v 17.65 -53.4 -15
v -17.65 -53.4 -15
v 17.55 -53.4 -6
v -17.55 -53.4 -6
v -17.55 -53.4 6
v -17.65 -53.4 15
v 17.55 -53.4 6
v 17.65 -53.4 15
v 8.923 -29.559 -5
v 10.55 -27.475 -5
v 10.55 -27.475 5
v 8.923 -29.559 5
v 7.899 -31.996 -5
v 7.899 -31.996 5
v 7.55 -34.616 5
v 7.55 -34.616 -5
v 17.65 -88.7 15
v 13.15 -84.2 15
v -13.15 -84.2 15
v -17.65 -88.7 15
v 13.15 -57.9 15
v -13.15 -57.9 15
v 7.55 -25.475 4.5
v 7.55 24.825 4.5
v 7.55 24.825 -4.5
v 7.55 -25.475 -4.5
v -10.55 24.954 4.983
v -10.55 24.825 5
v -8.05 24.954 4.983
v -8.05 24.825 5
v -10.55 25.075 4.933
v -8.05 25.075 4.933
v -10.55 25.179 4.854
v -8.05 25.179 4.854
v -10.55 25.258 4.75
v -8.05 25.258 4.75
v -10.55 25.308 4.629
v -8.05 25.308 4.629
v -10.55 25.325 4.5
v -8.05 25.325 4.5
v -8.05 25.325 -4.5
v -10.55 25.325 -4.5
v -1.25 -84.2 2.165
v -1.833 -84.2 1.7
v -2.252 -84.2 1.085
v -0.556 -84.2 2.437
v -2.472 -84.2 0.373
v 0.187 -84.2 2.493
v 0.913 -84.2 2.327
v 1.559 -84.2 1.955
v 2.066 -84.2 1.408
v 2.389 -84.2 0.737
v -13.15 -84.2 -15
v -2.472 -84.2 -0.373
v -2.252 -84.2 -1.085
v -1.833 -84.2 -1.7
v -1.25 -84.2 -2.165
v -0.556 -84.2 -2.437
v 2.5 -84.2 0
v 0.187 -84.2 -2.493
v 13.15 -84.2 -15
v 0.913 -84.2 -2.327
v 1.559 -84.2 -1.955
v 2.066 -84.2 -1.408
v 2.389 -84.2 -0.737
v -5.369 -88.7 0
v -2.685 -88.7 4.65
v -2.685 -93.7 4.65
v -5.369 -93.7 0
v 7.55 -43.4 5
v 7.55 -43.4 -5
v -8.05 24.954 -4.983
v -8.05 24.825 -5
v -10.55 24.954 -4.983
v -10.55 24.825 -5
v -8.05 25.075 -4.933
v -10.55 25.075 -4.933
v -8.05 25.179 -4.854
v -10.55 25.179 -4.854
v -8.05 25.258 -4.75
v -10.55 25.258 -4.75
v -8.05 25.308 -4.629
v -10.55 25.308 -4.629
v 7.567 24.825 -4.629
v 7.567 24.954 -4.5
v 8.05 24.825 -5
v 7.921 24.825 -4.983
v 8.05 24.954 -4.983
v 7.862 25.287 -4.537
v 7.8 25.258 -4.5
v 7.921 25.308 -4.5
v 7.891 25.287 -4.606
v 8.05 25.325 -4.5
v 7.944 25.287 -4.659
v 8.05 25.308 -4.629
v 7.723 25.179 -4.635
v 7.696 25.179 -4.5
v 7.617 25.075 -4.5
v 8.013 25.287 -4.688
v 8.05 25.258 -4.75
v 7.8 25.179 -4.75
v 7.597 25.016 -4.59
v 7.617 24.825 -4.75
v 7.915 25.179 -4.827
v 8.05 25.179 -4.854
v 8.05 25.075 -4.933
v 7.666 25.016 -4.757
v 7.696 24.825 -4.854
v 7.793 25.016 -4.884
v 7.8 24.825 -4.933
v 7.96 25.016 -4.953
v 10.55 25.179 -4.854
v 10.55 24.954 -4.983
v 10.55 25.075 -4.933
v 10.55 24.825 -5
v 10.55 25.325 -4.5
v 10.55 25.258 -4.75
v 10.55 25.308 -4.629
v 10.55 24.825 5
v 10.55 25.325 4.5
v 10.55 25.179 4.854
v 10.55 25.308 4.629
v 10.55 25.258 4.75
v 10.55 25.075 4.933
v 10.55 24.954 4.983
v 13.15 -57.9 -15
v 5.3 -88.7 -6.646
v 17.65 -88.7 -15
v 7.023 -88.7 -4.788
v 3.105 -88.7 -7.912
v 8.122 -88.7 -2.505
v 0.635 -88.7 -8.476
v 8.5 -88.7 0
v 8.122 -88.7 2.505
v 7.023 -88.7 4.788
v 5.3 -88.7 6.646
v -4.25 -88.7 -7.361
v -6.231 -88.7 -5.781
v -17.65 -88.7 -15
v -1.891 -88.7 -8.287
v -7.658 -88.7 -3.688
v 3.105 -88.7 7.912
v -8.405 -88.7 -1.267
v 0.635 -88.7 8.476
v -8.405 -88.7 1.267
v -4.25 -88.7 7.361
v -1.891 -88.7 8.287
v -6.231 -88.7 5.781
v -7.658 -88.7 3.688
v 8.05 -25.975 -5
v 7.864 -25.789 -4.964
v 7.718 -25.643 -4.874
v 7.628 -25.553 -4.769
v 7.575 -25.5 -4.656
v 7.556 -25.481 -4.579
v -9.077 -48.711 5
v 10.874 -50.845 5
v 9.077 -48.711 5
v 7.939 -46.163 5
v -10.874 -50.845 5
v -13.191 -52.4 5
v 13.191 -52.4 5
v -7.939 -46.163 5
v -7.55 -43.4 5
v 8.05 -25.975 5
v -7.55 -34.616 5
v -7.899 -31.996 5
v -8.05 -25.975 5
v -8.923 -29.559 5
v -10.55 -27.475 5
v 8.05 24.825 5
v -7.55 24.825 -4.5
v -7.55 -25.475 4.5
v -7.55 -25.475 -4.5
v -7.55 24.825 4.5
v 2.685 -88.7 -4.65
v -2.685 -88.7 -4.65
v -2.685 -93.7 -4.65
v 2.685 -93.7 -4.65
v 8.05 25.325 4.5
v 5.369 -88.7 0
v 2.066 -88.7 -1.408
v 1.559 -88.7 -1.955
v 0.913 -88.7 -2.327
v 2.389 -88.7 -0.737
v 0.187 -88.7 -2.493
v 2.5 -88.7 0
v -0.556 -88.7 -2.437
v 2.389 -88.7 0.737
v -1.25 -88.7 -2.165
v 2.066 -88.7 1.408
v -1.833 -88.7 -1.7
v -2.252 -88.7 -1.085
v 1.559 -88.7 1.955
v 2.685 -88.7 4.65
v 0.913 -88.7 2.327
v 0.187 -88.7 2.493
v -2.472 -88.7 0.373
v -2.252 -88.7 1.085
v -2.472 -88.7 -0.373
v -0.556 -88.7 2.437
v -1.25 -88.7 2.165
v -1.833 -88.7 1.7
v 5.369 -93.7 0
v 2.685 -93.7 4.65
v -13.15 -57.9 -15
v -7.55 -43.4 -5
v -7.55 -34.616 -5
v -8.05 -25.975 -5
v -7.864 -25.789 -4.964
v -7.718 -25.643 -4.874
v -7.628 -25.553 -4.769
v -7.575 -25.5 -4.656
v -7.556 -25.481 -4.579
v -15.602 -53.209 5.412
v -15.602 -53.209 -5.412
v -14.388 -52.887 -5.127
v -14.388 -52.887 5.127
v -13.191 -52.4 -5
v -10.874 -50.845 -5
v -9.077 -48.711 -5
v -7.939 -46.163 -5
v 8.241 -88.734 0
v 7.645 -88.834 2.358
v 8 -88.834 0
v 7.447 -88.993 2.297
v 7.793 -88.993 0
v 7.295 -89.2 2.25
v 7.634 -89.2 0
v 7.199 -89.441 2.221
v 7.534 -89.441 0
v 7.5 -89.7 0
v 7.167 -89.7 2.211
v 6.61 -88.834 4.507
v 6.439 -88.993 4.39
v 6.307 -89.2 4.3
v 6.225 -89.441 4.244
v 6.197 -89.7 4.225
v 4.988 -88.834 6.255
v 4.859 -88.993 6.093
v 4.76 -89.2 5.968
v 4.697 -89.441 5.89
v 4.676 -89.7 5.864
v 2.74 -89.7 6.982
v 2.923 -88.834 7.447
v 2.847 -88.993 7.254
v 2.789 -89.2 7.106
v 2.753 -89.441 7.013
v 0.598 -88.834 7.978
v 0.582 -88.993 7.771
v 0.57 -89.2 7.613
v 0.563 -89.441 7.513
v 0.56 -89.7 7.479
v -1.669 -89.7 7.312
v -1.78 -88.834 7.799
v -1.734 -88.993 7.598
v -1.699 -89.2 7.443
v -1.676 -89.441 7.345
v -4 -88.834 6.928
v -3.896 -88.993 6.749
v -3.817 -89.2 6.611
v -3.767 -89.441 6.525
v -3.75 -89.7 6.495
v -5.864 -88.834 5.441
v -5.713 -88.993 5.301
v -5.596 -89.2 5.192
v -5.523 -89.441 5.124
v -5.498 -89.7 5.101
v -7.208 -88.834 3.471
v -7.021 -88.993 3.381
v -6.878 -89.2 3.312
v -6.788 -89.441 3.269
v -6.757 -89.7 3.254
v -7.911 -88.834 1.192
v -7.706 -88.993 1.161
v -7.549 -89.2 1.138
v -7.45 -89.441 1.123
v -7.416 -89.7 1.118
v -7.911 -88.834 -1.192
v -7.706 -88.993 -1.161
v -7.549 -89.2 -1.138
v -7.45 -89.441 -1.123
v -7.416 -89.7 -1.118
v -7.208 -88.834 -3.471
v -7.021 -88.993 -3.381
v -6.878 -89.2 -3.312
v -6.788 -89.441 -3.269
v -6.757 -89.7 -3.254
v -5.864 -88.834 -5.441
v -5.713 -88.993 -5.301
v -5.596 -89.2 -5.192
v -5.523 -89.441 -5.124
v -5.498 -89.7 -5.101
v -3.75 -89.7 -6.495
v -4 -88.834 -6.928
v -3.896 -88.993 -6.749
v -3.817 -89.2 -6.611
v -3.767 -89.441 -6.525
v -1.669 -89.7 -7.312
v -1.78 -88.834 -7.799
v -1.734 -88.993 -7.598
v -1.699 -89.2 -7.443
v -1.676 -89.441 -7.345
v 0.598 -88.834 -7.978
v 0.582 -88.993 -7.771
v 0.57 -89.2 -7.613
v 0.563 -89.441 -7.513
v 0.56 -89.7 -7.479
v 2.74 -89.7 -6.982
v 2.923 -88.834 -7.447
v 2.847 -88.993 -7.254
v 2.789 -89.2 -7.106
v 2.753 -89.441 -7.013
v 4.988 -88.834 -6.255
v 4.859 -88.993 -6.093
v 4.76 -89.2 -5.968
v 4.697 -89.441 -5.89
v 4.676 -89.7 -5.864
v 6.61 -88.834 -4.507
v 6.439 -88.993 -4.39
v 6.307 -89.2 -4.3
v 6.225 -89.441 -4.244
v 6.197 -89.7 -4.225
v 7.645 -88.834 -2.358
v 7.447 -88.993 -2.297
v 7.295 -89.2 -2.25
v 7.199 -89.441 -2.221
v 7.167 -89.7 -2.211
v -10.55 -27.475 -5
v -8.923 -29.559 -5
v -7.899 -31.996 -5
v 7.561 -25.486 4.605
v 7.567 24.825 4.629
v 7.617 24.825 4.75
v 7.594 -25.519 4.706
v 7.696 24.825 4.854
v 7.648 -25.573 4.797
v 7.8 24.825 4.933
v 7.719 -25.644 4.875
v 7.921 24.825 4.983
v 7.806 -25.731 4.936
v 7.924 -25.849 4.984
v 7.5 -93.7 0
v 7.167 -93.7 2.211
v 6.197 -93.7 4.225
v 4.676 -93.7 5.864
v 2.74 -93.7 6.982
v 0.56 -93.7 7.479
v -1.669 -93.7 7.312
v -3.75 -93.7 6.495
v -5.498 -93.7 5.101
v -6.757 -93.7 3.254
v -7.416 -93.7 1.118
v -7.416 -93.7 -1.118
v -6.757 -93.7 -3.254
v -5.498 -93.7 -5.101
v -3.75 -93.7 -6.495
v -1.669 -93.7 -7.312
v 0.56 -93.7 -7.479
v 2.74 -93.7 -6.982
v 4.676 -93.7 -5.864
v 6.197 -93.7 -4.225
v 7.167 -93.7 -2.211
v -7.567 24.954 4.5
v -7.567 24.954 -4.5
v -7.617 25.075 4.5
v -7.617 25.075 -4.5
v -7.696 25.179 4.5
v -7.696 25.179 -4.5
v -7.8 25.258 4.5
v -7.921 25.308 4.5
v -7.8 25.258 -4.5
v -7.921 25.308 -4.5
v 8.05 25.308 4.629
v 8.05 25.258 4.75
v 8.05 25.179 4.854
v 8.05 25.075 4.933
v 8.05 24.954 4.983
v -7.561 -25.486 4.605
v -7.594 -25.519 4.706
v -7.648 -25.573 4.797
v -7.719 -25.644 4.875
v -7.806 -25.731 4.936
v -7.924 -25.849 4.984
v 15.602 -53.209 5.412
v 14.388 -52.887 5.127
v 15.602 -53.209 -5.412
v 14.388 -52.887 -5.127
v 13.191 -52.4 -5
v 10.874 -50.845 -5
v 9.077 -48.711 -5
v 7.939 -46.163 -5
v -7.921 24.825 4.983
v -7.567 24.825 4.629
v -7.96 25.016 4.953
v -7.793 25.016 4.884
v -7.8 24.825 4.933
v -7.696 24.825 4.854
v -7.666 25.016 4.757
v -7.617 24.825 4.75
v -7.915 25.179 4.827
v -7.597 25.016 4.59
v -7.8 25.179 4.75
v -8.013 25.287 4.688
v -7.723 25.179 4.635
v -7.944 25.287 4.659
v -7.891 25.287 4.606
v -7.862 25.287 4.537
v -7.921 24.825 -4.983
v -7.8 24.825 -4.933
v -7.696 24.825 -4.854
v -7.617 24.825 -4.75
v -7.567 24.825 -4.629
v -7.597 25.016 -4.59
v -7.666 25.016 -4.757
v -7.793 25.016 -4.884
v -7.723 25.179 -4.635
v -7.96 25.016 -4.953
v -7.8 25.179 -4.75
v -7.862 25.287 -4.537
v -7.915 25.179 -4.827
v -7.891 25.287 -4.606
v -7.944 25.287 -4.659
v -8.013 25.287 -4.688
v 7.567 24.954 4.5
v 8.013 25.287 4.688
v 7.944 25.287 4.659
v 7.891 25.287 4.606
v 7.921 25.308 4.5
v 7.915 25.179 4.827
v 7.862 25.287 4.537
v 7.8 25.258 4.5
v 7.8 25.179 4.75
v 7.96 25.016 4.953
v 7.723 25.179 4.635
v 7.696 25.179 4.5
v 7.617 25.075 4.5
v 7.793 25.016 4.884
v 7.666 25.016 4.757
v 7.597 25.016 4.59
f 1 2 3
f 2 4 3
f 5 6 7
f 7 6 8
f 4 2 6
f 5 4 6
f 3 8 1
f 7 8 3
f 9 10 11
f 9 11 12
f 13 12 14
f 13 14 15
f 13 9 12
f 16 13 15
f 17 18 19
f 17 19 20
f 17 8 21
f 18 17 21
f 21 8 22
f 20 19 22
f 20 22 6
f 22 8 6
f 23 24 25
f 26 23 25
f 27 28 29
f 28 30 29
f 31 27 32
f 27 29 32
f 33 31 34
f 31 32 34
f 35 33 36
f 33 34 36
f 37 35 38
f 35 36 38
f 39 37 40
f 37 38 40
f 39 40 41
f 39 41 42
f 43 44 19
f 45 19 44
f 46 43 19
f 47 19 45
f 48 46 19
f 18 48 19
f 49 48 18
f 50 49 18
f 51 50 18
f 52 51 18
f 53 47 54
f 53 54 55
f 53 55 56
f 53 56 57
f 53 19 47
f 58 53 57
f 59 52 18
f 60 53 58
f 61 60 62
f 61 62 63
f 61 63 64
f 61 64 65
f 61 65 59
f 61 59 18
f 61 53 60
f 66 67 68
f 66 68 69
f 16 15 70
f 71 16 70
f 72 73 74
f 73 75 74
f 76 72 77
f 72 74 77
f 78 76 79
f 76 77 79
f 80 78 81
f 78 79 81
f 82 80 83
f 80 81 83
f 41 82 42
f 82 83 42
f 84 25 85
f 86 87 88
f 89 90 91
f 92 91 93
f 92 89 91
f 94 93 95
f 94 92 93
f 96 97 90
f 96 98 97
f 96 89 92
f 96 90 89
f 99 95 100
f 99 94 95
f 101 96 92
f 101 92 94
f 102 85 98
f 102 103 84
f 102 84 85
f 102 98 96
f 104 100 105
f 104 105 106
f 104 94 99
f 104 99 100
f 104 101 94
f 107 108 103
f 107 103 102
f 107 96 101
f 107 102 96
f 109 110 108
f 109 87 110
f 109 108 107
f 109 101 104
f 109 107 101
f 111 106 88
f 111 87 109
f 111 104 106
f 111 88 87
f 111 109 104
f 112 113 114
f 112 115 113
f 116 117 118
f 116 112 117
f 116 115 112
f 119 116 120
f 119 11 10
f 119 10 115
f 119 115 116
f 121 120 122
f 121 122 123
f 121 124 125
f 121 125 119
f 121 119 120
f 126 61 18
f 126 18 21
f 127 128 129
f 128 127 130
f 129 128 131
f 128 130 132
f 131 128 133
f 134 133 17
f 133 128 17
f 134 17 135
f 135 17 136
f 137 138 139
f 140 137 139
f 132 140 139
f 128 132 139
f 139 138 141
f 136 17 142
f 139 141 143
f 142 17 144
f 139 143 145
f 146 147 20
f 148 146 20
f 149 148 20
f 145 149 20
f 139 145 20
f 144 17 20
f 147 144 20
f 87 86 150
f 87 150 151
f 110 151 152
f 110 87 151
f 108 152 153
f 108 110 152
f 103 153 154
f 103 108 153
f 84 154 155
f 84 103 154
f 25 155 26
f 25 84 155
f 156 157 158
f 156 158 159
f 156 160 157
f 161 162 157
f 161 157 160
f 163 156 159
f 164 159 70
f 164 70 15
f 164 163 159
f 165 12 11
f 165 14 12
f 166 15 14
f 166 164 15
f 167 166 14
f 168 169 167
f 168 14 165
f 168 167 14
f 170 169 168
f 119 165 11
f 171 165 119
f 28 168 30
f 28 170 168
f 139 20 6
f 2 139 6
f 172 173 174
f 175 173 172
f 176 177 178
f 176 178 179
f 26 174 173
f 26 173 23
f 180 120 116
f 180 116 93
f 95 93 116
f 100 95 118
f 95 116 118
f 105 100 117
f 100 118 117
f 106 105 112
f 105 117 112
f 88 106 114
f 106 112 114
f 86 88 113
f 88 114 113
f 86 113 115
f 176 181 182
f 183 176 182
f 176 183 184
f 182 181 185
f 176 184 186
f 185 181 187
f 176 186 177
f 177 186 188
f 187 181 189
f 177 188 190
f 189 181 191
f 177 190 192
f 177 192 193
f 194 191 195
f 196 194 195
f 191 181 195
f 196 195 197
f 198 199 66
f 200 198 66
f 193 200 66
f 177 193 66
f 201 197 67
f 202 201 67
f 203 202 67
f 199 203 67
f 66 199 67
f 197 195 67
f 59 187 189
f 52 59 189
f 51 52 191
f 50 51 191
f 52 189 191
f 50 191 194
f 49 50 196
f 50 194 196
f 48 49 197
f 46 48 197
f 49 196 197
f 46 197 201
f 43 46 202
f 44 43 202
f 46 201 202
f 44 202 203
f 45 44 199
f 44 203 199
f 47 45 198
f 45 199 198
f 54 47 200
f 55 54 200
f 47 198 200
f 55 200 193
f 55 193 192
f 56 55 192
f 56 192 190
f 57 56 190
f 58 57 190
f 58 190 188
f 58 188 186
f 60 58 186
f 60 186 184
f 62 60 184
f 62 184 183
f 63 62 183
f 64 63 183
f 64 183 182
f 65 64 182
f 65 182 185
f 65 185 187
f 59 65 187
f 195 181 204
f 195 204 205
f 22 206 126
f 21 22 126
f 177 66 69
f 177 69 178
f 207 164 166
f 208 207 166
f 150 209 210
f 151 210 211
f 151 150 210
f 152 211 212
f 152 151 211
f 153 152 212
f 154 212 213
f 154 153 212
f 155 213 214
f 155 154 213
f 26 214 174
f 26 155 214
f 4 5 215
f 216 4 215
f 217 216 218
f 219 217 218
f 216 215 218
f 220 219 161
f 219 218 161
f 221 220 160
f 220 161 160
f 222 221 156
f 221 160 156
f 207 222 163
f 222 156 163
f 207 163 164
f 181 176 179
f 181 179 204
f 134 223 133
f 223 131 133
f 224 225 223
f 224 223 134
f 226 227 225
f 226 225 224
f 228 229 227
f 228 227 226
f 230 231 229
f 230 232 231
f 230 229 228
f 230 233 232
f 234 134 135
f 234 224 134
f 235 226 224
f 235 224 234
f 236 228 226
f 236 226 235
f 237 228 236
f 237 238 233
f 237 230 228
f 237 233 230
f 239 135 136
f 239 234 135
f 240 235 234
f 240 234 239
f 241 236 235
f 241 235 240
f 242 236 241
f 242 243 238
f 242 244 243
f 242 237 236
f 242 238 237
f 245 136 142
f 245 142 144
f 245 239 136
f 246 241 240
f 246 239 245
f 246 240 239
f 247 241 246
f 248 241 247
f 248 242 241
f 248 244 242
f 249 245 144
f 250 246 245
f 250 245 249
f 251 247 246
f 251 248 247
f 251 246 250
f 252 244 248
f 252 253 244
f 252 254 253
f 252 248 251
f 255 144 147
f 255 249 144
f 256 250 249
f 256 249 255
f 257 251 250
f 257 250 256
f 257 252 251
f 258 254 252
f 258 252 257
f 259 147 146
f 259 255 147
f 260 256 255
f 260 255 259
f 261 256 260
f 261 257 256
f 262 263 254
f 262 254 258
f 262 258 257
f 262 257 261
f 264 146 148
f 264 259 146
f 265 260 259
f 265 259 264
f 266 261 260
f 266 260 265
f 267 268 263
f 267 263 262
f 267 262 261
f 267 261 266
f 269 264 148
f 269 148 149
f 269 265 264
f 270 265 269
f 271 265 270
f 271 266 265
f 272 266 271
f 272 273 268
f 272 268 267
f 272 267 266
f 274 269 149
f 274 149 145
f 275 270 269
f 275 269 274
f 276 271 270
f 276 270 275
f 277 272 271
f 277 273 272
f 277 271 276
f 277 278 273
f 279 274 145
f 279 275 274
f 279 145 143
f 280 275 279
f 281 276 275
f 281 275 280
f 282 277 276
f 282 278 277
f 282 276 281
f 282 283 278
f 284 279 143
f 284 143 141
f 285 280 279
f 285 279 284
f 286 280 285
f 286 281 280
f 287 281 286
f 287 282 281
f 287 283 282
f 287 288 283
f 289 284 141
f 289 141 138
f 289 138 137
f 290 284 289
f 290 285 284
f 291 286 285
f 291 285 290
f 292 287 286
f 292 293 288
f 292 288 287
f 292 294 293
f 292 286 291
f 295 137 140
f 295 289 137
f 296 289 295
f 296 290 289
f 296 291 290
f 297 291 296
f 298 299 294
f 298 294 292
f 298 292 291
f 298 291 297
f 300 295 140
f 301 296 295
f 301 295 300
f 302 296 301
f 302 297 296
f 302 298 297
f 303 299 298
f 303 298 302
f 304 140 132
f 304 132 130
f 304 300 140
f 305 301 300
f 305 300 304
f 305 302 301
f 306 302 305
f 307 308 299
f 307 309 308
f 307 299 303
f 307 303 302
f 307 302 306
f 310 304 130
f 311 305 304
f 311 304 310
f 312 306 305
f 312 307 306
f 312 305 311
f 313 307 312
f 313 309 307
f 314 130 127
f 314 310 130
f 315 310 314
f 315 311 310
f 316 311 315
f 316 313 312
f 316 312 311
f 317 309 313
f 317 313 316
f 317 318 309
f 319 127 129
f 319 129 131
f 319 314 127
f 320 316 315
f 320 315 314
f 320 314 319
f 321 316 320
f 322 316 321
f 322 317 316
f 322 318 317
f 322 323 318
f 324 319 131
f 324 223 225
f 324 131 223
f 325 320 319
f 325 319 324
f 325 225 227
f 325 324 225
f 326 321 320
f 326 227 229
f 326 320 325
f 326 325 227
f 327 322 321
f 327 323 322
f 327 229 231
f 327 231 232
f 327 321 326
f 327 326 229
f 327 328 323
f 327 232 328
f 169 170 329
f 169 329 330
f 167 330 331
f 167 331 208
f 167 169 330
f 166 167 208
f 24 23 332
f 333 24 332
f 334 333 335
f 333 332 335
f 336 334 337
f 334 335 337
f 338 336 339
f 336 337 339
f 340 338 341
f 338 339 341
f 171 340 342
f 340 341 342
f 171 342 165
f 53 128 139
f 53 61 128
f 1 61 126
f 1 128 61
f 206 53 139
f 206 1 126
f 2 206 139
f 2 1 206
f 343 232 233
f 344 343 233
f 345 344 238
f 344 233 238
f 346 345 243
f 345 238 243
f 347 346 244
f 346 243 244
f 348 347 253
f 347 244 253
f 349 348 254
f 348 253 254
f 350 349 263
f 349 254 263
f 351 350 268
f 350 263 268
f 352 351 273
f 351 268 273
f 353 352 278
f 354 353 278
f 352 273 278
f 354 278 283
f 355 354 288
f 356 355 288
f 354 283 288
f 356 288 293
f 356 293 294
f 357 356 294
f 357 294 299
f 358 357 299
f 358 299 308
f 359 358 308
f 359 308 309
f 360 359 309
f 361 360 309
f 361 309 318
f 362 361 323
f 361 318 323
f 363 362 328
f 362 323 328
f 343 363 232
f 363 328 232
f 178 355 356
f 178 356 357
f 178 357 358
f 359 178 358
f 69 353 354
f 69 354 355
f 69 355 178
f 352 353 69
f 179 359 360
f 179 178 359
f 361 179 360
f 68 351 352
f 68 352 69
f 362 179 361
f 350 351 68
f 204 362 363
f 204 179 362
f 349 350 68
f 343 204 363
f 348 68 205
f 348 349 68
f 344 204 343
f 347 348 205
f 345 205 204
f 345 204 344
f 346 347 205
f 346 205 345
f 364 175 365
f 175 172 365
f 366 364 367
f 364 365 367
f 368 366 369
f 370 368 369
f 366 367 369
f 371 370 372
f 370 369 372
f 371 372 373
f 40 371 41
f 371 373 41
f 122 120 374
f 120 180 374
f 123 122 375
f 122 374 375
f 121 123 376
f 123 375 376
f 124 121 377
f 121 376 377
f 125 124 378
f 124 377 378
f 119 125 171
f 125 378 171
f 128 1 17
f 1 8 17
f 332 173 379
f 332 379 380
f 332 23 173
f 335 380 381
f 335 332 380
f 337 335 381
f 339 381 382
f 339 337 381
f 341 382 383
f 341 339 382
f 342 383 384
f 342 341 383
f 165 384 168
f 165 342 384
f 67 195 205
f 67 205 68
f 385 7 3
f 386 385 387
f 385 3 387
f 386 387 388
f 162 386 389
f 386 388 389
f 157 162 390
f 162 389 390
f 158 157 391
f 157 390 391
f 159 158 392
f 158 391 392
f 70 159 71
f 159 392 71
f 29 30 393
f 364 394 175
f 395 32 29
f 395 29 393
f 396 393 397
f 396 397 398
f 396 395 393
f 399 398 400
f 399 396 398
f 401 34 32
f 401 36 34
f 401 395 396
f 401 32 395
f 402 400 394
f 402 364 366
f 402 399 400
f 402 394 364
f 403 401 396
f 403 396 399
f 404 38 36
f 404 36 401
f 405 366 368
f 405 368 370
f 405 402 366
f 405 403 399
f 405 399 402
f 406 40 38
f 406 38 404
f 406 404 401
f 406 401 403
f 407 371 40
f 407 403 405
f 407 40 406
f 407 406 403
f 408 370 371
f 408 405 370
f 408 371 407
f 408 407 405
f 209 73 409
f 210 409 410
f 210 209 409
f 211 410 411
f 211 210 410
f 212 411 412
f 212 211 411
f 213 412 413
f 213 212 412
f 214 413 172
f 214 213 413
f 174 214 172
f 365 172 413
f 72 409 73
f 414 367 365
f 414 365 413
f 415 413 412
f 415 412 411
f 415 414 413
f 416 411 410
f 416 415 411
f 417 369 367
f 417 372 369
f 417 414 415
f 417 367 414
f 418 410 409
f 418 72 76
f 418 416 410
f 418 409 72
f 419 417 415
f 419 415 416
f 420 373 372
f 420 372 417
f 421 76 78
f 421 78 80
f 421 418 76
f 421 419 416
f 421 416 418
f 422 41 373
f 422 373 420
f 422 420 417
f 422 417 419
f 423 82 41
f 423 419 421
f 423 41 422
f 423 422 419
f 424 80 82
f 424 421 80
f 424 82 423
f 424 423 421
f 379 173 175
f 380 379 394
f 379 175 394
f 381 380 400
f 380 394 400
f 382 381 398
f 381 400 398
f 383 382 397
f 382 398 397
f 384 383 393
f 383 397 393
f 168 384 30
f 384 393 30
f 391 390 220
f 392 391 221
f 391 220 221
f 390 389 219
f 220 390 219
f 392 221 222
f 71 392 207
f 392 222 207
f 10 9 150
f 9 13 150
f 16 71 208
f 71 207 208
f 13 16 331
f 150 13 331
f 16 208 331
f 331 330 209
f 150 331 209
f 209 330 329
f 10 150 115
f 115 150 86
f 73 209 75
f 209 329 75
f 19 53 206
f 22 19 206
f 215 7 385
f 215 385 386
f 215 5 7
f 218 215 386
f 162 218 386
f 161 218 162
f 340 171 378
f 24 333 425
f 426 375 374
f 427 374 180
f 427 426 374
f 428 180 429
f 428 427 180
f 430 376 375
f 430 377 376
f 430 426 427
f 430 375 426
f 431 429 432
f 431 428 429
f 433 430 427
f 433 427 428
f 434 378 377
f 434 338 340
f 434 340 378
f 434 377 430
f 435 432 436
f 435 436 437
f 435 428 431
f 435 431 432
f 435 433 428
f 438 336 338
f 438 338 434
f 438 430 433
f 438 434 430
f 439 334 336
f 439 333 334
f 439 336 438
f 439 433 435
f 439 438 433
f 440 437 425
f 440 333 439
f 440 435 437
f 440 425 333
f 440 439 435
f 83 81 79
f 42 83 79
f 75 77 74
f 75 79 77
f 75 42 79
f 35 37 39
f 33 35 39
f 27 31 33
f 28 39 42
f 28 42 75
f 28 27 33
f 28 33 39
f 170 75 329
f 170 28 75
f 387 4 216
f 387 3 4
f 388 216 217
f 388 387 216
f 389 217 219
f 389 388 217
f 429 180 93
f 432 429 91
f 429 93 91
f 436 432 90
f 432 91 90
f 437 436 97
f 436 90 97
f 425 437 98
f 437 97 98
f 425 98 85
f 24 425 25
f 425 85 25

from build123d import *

# Parameters (mm, degrees)
SKETCH2_W               = 25.3
SKETCH2_H               = 25.3
BOSS_EXTRUDE1_DEPTH     = 15
CUT_EXTRUDE1_DEPTH      = 94.422320673
CUT_EXTRUDE1_DEPTH_BACK = 94.422320673
SKETCH3_W               = 10
SKETCH3_H               = 61.95
FILLET1_R               = 10
FILLET2_R               = 1
SKETCH4_R               = 7.5
BOSS_EXTRUDE2_DEPTH     = 5
FILLET3_R               = 1
CUT_EXTRUDE2_REACH      = 101.97
SKETCH5_R               = 2.5
BOSS_EXTRUDE3_DEPTH     = 10
FILLET4_R               = 10
SKETCH11_W              = 15.1
SKETCH11_H              = 10
CUT_EXTRUDE4_DEPTH      = 34.025
FILLET5_R               = 0.5
FILLET6_R               = 0.5
CUT_EXTRUDE5_DEPTH      = 100.956052843
CUT_EXTRUDE5_DEPTH_BACK = 100.956052843
SKETCH12_W              = 26.3
SKETCH12_H              = 26.3


with BuildPart() as part:
    # Sketch2 → Boss-Extrude1 (new, symmetric)
    with BuildSketch(Plane.XY):
        Polygon((-7.55, -53.4), (-7.55, 8.55), (7.55, 8.55), (7.55, -53.4), (17.65, -53.4), (17.65, -88.7), (-17.65, -88.7), (-17.65, -53.4), align=None)
        with Locations((0, -71.05)):
            Rectangle(SKETCH2_W, SKETCH2_H, mode=Mode.SUBTRACT)
    extrude(amount=BOSS_EXTRUDE1_DEPTH, both=True)

    # Sketch3 → Cut-Extrude1 (cut, two sides: drawn at the far end of the back side and taken through both)
    with BuildSketch(Plane(origin=(7.55, 0, 0), x_dir=(0, 0, -1), z_dir=(1, 0, 0)).offset(-CUT_EXTRUDE1_DEPTH_BACK)):
        with Locations((-10, -22.425)):
            Rectangle(SKETCH3_W, SKETCH3_H)
        with Locations((10, -22.425)):
            Rectangle(SKETCH3_W, SKETCH3_H)
    extrude(amount=CUT_EXTRUDE1_DEPTH + CUT_EXTRUDE1_DEPTH_BACK, mode=Mode.SUBTRACT)

    # Fillet1
    fillet1_edges = [part.edges().sort_by_distance(p)[0] for p in [
        (-7.55, -53.4, 0),
        (7.55, -53.4, 0),
    ]]
    fillet(fillet1_edges, radius=FILLET1_R)

    # Fillet2
    fillet2_edges = [part.edges().sort_by_distance(p)[0] for p in [
        (0, -53.4, 5),
        (0, -53.4, -5),
    ]]
    fillet(fillet2_edges, radius=FILLET2_R)

    # Sketch4 → Boss-Extrude2 (add)
    with BuildSketch(Plane.XZ.offset(88.7)):
        Circle(SKETCH4_R)
        Polygon((5.369357503, 0), (2.684678752, 4.65), (-2.684678752, 4.65), (-5.369357503, 0), (-2.684678752, -4.65), (2.684678752, -4.65), align=None, mode=Mode.SUBTRACT)
    extrude(amount=BOSS_EXTRUDE2_DEPTH)

    # Fillet3
    fillet3_edges = [part.edges().sort_by_distance(p)[0] for p in [
        (-7.5, -88.7, 0),
    ]]
    fillet(fillet3_edges, radius=FILLET3_R)

    # Sketch5 → Cut-Extrude2 (cut, up to next)
    with BuildSketch(Plane.XZ.offset(88.7), mode=Mode.PRIVATE) as cut_extrude2_sk1:
        Circle(SKETCH5_R)
    cut_extrude2_tool1 = extrude(cut_extrude2_sk1.sketch, amount=-CUT_EXTRUDE2_REACH, mode=Mode.PRIVATE) & part.part
    add(cut_extrude2_tool1.solids().sort_by_distance((0, -88.7, 0))[0], mode=Mode.SUBTRACT)

    # Sketch9 → Boss-Extrude3 (add)
    with BuildSketch(Plane.XY.offset(5)):
        Polygon((-10.55, -27.475), (-7.55, -27.475), (-7.55, -25.475), (-7.55, 8.55), (-7.55, 25.325), (-10.55, 25.325), (-10.55, -25.325), align=None)
        Polygon((10.55, 25.325), (7.55, 25.325), (7.55, 8.55), (7.55, -25.475), (7.55, -27.475), (10.55, -27.475), (10.55, -25.325), align=None)
        Polygon((7.55, -27.475), (7.55, -25.475), (7.4, -25.475), (-7.4, -25.475), (-7.55, -25.475), (-7.55, -27.475), align=None)
    extrude(amount=-BOSS_EXTRUDE3_DEPTH)

    # Fillet4
    # the kernel refuses this fillet: 10 mm, written as the material it adds along each edge
    with BuildSketch(Plane(origin=(-7.55, -27.475, 5), x_dir=(0, -1, 0), z_dir=(0, 0, -1)), Plane(origin=(7.55, -27.475, -5), x_dir=(0, -1, 0), z_dir=(0, 0, 1))) as fillet4_piece_1:
        with BuildLine():
            CenterArc((7.141428429, 10), FILLET4_R, 224.427004001, 45.572995999)
            Line((0, 3), (-0.142828569, 2.86))
            ThreePointArc((-0.142828569, 2.86), (-0.2, 1.5), (-0.2, 0))
            Line((-0.2, 0), (0, -0.2))
            Line((0, -0.2), (7.141428429, -0.2))
            Line((7.141428429, -0.2), (7.141428429, 0))
        make_face()
    extrude(amount=10)

    # Sketch11 → Cut-Extrude4 (cut)
    with BuildSketch(Plane(origin=(0, 8.55, 0), x_dir=(1, 0, 0), z_dir=(0, 1, 0))):
        Rectangle(SKETCH11_W, SKETCH11_H)
    extrude(amount=-CUT_EXTRUDE4_DEPTH, mode=Mode.SUBTRACT)

    # Fillet5
    fillet5_edges = [part.edges().sort_by_distance(p)[0] for p in [
        (7.55, -0.075, 5),
        (7.55, -0.075, -5),
        (-7.55, -0.075, 5),
        (-7.55, -0.075, -5),
        (0, -25.475, -5),
        (0, -25.475, 5),
    ]]
    fillet(fillet5_edges, radius=FILLET5_R)

    # Fillet6
    fillet6_edges = [part.edges().sort_by_distance(p)[0] for p in [
        (9.3, 25.325, 5),
        (-9.3, 25.325, -5),
        (9.3, 25.325, -5),
        (7.55, 25.325, 0),
        (7.696446609, 25.325, 4.853553391),
        (7.696446609, 25.325, -4.853553391),
        (-7.55, 25.325, 0),
        (-9.3, 25.325, 5),
        (-7.696446609, 25.325, 4.853553391),
        (-7.696446609, 25.325, -4.853553391),
    ]]
    fillet(fillet6_edges, radius=FILLET6_R)

    # Sketch12 → Cut-Extrude5 (cut, two sides: drawn at the far end of the back side and taken through both)
    with BuildSketch(Plane.XY.offset(15).offset(-CUT_EXTRUDE5_DEPTH_BACK)):
        with Locations((0, -71.05)):
            Rectangle(SKETCH12_W, SKETCH12_H)
    extrude(amount=CUT_EXTRUDE5_DEPTH + CUT_EXTRUDE5_DEPTH_BACK, mode=Mode.SUBTRACT)


solid = part.part
